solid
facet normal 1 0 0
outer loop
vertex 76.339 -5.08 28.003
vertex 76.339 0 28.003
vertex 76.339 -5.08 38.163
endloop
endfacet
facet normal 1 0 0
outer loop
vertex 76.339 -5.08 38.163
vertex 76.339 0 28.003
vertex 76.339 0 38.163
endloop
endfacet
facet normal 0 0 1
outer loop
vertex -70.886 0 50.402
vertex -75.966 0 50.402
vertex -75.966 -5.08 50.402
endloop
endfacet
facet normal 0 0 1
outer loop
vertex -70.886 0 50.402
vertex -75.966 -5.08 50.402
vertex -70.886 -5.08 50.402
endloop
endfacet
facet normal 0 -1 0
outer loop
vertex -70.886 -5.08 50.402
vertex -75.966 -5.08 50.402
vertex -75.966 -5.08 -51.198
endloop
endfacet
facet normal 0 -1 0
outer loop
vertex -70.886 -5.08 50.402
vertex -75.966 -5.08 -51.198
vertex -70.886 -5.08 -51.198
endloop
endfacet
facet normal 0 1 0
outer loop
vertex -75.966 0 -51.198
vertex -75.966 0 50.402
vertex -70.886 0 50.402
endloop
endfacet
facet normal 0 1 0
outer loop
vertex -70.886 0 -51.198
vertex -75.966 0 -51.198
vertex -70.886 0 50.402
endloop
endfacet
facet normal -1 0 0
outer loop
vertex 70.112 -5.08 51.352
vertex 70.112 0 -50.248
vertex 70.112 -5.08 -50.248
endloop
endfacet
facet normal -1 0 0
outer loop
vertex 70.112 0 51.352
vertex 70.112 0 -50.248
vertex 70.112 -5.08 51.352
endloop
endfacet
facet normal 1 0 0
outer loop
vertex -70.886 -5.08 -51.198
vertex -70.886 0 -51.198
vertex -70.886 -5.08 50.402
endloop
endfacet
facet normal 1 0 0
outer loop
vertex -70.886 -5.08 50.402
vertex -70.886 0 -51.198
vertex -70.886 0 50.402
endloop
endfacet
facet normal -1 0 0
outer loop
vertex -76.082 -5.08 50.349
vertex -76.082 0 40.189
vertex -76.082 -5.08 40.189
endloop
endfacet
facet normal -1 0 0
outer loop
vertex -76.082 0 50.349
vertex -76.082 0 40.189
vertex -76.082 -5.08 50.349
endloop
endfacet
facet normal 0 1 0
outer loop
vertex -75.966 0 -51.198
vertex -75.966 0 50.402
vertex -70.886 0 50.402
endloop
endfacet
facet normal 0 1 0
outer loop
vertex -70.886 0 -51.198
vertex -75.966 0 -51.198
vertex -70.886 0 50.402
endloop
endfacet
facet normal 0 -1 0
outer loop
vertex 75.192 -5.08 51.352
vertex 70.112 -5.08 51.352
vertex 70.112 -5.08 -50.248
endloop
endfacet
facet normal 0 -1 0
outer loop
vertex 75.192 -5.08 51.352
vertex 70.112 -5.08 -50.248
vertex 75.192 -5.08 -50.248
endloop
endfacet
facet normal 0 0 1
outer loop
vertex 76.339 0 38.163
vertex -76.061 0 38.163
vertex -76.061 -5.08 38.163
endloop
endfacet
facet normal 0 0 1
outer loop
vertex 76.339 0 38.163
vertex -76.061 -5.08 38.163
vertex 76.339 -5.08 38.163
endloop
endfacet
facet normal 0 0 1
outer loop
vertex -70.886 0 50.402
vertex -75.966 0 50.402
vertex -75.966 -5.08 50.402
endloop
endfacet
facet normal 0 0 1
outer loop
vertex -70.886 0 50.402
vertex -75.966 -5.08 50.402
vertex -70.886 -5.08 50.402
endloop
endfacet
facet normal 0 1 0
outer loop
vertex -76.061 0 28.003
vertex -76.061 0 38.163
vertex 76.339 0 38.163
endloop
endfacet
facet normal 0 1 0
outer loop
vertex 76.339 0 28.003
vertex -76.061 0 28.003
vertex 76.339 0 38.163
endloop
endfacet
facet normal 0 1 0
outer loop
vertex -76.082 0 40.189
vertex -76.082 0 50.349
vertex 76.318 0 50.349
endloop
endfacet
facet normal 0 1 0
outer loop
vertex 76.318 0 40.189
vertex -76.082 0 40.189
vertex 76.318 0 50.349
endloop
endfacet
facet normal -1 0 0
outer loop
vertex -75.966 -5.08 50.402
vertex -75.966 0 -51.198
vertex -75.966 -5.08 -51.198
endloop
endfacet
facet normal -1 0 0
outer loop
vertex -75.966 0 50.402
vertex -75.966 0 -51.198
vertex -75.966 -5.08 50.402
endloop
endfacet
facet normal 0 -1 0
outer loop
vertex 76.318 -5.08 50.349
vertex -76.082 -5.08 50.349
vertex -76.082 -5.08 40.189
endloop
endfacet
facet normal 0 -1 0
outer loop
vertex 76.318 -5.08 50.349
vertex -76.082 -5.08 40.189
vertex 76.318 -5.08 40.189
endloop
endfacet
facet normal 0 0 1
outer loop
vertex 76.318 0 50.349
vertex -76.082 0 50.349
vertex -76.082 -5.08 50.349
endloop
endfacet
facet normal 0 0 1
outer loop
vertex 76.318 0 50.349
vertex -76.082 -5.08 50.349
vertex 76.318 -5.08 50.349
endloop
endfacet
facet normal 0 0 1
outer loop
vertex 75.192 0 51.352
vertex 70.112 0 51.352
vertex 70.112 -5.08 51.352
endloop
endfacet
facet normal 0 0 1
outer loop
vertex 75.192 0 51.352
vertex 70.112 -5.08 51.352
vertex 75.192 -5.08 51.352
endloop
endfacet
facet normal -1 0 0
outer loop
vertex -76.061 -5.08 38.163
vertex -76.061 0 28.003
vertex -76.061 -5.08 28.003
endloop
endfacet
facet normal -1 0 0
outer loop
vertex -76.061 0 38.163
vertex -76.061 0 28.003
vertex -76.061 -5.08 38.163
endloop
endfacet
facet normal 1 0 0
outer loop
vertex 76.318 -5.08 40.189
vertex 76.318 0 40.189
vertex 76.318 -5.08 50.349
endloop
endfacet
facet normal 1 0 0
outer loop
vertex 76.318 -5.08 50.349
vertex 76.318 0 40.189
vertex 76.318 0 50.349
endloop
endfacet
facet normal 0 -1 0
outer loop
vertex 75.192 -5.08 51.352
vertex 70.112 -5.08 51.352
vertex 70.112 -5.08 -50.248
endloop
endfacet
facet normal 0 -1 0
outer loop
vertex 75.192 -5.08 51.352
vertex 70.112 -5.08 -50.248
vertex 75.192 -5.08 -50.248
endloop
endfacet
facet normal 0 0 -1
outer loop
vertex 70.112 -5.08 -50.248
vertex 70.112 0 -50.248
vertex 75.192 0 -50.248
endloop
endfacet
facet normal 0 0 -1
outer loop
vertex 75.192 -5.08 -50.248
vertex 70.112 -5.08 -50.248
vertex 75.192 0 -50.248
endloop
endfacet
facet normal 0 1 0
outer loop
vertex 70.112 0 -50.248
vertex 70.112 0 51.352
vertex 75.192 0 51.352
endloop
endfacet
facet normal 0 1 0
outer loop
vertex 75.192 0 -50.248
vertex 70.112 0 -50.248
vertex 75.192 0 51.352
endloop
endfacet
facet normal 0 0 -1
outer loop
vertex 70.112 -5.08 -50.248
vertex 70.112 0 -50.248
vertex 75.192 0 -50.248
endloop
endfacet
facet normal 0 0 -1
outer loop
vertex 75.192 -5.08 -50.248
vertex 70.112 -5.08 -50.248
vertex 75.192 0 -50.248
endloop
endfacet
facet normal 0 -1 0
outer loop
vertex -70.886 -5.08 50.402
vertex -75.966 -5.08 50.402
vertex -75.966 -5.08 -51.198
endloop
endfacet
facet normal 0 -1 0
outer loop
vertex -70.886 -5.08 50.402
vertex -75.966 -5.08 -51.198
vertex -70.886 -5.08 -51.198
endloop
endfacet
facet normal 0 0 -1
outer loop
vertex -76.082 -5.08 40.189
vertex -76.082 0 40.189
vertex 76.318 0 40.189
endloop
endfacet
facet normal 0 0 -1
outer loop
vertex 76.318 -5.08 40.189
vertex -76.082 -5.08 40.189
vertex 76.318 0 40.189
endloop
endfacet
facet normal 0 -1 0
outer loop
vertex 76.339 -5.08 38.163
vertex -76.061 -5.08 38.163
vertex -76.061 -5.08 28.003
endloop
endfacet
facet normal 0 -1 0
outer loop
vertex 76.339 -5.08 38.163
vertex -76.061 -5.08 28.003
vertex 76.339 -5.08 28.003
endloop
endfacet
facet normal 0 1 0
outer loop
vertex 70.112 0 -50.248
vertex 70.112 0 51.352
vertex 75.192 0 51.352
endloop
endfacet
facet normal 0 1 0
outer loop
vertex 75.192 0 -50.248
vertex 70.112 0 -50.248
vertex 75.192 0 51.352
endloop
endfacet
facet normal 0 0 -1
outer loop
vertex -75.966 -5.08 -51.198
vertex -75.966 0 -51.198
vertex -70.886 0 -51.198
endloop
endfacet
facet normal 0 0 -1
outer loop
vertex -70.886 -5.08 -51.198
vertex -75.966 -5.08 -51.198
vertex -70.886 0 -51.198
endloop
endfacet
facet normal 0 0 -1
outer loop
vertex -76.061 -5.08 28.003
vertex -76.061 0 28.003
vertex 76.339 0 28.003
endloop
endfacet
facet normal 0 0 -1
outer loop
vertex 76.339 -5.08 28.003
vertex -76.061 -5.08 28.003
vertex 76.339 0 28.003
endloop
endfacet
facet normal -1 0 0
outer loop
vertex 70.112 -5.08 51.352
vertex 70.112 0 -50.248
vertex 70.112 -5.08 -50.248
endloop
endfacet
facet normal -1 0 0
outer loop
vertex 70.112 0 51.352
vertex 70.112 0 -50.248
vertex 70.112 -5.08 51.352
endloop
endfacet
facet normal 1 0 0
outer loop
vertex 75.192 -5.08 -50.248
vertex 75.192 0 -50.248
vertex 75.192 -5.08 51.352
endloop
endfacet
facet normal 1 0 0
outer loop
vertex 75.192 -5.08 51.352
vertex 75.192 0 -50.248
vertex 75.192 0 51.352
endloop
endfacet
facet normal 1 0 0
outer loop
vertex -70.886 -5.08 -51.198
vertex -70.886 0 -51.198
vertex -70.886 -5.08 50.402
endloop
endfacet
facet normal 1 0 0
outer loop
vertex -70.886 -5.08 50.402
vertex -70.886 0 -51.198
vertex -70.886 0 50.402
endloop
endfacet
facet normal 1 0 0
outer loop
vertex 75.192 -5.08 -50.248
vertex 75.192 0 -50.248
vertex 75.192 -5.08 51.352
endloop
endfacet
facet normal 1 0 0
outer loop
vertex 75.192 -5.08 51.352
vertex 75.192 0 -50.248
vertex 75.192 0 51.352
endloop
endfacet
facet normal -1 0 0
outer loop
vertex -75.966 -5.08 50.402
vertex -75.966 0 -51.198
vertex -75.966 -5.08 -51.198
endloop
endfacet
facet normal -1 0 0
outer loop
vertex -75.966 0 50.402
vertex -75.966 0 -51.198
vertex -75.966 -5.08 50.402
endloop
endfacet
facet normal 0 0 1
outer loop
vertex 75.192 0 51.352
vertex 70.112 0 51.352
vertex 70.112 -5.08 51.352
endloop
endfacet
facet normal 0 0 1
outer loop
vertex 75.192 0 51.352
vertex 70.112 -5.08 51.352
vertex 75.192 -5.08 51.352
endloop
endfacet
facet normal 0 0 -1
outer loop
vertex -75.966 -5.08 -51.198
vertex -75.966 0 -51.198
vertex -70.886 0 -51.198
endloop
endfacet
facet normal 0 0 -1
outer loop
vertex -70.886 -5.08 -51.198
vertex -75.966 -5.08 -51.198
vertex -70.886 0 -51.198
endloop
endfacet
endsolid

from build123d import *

# Parameters (mm, degrees)
F0_W     = 5.08
F0_H     = 101.6
F1_DEPTH = 5.08
F2_DEPTH = 5.08
F3_W     = 152.4
F3_H     = 10.16
F4_DEPTH = 5.08


with BuildPart() as f1:
    # F0 (on Front) → F1 (new body)
    with BuildSketch(Plane.XZ):
        with Locations((-73.426195, -0.398143)):
            Rectangle(F0_W, F0_H)
        with Locations((72.652138, 0.552174)):
            Rectangle(F0_W, F0_H)
    extrude(amount=F1_DEPTH)


with BuildPart() as f2:
    # F0 (on Front) → F2 (new body)
    with BuildSketch(Plane.XZ):
        with Locations((-73.426195, -0.398143)):
            Rectangle(F0_W, F0_H)
        with Locations((72.652138, 0.552174)):
            Rectangle(F0_W, F0_H)
    extrude(amount=F2_DEPTH)


with BuildPart() as f4:
    # F3 (on Front) → F4 (new body)
    with BuildSketch(Plane.XZ):
        with Locations((0.11846, 45.268817)):
            Rectangle(F3_W, F3_H)
        with Locations((0.138505, 33.083423)):
            Rectangle(F3_W, F3_H)
    extrude(amount=F4_DEPTH)


solid = Compound([f1.part, f2.part, f4.part])
